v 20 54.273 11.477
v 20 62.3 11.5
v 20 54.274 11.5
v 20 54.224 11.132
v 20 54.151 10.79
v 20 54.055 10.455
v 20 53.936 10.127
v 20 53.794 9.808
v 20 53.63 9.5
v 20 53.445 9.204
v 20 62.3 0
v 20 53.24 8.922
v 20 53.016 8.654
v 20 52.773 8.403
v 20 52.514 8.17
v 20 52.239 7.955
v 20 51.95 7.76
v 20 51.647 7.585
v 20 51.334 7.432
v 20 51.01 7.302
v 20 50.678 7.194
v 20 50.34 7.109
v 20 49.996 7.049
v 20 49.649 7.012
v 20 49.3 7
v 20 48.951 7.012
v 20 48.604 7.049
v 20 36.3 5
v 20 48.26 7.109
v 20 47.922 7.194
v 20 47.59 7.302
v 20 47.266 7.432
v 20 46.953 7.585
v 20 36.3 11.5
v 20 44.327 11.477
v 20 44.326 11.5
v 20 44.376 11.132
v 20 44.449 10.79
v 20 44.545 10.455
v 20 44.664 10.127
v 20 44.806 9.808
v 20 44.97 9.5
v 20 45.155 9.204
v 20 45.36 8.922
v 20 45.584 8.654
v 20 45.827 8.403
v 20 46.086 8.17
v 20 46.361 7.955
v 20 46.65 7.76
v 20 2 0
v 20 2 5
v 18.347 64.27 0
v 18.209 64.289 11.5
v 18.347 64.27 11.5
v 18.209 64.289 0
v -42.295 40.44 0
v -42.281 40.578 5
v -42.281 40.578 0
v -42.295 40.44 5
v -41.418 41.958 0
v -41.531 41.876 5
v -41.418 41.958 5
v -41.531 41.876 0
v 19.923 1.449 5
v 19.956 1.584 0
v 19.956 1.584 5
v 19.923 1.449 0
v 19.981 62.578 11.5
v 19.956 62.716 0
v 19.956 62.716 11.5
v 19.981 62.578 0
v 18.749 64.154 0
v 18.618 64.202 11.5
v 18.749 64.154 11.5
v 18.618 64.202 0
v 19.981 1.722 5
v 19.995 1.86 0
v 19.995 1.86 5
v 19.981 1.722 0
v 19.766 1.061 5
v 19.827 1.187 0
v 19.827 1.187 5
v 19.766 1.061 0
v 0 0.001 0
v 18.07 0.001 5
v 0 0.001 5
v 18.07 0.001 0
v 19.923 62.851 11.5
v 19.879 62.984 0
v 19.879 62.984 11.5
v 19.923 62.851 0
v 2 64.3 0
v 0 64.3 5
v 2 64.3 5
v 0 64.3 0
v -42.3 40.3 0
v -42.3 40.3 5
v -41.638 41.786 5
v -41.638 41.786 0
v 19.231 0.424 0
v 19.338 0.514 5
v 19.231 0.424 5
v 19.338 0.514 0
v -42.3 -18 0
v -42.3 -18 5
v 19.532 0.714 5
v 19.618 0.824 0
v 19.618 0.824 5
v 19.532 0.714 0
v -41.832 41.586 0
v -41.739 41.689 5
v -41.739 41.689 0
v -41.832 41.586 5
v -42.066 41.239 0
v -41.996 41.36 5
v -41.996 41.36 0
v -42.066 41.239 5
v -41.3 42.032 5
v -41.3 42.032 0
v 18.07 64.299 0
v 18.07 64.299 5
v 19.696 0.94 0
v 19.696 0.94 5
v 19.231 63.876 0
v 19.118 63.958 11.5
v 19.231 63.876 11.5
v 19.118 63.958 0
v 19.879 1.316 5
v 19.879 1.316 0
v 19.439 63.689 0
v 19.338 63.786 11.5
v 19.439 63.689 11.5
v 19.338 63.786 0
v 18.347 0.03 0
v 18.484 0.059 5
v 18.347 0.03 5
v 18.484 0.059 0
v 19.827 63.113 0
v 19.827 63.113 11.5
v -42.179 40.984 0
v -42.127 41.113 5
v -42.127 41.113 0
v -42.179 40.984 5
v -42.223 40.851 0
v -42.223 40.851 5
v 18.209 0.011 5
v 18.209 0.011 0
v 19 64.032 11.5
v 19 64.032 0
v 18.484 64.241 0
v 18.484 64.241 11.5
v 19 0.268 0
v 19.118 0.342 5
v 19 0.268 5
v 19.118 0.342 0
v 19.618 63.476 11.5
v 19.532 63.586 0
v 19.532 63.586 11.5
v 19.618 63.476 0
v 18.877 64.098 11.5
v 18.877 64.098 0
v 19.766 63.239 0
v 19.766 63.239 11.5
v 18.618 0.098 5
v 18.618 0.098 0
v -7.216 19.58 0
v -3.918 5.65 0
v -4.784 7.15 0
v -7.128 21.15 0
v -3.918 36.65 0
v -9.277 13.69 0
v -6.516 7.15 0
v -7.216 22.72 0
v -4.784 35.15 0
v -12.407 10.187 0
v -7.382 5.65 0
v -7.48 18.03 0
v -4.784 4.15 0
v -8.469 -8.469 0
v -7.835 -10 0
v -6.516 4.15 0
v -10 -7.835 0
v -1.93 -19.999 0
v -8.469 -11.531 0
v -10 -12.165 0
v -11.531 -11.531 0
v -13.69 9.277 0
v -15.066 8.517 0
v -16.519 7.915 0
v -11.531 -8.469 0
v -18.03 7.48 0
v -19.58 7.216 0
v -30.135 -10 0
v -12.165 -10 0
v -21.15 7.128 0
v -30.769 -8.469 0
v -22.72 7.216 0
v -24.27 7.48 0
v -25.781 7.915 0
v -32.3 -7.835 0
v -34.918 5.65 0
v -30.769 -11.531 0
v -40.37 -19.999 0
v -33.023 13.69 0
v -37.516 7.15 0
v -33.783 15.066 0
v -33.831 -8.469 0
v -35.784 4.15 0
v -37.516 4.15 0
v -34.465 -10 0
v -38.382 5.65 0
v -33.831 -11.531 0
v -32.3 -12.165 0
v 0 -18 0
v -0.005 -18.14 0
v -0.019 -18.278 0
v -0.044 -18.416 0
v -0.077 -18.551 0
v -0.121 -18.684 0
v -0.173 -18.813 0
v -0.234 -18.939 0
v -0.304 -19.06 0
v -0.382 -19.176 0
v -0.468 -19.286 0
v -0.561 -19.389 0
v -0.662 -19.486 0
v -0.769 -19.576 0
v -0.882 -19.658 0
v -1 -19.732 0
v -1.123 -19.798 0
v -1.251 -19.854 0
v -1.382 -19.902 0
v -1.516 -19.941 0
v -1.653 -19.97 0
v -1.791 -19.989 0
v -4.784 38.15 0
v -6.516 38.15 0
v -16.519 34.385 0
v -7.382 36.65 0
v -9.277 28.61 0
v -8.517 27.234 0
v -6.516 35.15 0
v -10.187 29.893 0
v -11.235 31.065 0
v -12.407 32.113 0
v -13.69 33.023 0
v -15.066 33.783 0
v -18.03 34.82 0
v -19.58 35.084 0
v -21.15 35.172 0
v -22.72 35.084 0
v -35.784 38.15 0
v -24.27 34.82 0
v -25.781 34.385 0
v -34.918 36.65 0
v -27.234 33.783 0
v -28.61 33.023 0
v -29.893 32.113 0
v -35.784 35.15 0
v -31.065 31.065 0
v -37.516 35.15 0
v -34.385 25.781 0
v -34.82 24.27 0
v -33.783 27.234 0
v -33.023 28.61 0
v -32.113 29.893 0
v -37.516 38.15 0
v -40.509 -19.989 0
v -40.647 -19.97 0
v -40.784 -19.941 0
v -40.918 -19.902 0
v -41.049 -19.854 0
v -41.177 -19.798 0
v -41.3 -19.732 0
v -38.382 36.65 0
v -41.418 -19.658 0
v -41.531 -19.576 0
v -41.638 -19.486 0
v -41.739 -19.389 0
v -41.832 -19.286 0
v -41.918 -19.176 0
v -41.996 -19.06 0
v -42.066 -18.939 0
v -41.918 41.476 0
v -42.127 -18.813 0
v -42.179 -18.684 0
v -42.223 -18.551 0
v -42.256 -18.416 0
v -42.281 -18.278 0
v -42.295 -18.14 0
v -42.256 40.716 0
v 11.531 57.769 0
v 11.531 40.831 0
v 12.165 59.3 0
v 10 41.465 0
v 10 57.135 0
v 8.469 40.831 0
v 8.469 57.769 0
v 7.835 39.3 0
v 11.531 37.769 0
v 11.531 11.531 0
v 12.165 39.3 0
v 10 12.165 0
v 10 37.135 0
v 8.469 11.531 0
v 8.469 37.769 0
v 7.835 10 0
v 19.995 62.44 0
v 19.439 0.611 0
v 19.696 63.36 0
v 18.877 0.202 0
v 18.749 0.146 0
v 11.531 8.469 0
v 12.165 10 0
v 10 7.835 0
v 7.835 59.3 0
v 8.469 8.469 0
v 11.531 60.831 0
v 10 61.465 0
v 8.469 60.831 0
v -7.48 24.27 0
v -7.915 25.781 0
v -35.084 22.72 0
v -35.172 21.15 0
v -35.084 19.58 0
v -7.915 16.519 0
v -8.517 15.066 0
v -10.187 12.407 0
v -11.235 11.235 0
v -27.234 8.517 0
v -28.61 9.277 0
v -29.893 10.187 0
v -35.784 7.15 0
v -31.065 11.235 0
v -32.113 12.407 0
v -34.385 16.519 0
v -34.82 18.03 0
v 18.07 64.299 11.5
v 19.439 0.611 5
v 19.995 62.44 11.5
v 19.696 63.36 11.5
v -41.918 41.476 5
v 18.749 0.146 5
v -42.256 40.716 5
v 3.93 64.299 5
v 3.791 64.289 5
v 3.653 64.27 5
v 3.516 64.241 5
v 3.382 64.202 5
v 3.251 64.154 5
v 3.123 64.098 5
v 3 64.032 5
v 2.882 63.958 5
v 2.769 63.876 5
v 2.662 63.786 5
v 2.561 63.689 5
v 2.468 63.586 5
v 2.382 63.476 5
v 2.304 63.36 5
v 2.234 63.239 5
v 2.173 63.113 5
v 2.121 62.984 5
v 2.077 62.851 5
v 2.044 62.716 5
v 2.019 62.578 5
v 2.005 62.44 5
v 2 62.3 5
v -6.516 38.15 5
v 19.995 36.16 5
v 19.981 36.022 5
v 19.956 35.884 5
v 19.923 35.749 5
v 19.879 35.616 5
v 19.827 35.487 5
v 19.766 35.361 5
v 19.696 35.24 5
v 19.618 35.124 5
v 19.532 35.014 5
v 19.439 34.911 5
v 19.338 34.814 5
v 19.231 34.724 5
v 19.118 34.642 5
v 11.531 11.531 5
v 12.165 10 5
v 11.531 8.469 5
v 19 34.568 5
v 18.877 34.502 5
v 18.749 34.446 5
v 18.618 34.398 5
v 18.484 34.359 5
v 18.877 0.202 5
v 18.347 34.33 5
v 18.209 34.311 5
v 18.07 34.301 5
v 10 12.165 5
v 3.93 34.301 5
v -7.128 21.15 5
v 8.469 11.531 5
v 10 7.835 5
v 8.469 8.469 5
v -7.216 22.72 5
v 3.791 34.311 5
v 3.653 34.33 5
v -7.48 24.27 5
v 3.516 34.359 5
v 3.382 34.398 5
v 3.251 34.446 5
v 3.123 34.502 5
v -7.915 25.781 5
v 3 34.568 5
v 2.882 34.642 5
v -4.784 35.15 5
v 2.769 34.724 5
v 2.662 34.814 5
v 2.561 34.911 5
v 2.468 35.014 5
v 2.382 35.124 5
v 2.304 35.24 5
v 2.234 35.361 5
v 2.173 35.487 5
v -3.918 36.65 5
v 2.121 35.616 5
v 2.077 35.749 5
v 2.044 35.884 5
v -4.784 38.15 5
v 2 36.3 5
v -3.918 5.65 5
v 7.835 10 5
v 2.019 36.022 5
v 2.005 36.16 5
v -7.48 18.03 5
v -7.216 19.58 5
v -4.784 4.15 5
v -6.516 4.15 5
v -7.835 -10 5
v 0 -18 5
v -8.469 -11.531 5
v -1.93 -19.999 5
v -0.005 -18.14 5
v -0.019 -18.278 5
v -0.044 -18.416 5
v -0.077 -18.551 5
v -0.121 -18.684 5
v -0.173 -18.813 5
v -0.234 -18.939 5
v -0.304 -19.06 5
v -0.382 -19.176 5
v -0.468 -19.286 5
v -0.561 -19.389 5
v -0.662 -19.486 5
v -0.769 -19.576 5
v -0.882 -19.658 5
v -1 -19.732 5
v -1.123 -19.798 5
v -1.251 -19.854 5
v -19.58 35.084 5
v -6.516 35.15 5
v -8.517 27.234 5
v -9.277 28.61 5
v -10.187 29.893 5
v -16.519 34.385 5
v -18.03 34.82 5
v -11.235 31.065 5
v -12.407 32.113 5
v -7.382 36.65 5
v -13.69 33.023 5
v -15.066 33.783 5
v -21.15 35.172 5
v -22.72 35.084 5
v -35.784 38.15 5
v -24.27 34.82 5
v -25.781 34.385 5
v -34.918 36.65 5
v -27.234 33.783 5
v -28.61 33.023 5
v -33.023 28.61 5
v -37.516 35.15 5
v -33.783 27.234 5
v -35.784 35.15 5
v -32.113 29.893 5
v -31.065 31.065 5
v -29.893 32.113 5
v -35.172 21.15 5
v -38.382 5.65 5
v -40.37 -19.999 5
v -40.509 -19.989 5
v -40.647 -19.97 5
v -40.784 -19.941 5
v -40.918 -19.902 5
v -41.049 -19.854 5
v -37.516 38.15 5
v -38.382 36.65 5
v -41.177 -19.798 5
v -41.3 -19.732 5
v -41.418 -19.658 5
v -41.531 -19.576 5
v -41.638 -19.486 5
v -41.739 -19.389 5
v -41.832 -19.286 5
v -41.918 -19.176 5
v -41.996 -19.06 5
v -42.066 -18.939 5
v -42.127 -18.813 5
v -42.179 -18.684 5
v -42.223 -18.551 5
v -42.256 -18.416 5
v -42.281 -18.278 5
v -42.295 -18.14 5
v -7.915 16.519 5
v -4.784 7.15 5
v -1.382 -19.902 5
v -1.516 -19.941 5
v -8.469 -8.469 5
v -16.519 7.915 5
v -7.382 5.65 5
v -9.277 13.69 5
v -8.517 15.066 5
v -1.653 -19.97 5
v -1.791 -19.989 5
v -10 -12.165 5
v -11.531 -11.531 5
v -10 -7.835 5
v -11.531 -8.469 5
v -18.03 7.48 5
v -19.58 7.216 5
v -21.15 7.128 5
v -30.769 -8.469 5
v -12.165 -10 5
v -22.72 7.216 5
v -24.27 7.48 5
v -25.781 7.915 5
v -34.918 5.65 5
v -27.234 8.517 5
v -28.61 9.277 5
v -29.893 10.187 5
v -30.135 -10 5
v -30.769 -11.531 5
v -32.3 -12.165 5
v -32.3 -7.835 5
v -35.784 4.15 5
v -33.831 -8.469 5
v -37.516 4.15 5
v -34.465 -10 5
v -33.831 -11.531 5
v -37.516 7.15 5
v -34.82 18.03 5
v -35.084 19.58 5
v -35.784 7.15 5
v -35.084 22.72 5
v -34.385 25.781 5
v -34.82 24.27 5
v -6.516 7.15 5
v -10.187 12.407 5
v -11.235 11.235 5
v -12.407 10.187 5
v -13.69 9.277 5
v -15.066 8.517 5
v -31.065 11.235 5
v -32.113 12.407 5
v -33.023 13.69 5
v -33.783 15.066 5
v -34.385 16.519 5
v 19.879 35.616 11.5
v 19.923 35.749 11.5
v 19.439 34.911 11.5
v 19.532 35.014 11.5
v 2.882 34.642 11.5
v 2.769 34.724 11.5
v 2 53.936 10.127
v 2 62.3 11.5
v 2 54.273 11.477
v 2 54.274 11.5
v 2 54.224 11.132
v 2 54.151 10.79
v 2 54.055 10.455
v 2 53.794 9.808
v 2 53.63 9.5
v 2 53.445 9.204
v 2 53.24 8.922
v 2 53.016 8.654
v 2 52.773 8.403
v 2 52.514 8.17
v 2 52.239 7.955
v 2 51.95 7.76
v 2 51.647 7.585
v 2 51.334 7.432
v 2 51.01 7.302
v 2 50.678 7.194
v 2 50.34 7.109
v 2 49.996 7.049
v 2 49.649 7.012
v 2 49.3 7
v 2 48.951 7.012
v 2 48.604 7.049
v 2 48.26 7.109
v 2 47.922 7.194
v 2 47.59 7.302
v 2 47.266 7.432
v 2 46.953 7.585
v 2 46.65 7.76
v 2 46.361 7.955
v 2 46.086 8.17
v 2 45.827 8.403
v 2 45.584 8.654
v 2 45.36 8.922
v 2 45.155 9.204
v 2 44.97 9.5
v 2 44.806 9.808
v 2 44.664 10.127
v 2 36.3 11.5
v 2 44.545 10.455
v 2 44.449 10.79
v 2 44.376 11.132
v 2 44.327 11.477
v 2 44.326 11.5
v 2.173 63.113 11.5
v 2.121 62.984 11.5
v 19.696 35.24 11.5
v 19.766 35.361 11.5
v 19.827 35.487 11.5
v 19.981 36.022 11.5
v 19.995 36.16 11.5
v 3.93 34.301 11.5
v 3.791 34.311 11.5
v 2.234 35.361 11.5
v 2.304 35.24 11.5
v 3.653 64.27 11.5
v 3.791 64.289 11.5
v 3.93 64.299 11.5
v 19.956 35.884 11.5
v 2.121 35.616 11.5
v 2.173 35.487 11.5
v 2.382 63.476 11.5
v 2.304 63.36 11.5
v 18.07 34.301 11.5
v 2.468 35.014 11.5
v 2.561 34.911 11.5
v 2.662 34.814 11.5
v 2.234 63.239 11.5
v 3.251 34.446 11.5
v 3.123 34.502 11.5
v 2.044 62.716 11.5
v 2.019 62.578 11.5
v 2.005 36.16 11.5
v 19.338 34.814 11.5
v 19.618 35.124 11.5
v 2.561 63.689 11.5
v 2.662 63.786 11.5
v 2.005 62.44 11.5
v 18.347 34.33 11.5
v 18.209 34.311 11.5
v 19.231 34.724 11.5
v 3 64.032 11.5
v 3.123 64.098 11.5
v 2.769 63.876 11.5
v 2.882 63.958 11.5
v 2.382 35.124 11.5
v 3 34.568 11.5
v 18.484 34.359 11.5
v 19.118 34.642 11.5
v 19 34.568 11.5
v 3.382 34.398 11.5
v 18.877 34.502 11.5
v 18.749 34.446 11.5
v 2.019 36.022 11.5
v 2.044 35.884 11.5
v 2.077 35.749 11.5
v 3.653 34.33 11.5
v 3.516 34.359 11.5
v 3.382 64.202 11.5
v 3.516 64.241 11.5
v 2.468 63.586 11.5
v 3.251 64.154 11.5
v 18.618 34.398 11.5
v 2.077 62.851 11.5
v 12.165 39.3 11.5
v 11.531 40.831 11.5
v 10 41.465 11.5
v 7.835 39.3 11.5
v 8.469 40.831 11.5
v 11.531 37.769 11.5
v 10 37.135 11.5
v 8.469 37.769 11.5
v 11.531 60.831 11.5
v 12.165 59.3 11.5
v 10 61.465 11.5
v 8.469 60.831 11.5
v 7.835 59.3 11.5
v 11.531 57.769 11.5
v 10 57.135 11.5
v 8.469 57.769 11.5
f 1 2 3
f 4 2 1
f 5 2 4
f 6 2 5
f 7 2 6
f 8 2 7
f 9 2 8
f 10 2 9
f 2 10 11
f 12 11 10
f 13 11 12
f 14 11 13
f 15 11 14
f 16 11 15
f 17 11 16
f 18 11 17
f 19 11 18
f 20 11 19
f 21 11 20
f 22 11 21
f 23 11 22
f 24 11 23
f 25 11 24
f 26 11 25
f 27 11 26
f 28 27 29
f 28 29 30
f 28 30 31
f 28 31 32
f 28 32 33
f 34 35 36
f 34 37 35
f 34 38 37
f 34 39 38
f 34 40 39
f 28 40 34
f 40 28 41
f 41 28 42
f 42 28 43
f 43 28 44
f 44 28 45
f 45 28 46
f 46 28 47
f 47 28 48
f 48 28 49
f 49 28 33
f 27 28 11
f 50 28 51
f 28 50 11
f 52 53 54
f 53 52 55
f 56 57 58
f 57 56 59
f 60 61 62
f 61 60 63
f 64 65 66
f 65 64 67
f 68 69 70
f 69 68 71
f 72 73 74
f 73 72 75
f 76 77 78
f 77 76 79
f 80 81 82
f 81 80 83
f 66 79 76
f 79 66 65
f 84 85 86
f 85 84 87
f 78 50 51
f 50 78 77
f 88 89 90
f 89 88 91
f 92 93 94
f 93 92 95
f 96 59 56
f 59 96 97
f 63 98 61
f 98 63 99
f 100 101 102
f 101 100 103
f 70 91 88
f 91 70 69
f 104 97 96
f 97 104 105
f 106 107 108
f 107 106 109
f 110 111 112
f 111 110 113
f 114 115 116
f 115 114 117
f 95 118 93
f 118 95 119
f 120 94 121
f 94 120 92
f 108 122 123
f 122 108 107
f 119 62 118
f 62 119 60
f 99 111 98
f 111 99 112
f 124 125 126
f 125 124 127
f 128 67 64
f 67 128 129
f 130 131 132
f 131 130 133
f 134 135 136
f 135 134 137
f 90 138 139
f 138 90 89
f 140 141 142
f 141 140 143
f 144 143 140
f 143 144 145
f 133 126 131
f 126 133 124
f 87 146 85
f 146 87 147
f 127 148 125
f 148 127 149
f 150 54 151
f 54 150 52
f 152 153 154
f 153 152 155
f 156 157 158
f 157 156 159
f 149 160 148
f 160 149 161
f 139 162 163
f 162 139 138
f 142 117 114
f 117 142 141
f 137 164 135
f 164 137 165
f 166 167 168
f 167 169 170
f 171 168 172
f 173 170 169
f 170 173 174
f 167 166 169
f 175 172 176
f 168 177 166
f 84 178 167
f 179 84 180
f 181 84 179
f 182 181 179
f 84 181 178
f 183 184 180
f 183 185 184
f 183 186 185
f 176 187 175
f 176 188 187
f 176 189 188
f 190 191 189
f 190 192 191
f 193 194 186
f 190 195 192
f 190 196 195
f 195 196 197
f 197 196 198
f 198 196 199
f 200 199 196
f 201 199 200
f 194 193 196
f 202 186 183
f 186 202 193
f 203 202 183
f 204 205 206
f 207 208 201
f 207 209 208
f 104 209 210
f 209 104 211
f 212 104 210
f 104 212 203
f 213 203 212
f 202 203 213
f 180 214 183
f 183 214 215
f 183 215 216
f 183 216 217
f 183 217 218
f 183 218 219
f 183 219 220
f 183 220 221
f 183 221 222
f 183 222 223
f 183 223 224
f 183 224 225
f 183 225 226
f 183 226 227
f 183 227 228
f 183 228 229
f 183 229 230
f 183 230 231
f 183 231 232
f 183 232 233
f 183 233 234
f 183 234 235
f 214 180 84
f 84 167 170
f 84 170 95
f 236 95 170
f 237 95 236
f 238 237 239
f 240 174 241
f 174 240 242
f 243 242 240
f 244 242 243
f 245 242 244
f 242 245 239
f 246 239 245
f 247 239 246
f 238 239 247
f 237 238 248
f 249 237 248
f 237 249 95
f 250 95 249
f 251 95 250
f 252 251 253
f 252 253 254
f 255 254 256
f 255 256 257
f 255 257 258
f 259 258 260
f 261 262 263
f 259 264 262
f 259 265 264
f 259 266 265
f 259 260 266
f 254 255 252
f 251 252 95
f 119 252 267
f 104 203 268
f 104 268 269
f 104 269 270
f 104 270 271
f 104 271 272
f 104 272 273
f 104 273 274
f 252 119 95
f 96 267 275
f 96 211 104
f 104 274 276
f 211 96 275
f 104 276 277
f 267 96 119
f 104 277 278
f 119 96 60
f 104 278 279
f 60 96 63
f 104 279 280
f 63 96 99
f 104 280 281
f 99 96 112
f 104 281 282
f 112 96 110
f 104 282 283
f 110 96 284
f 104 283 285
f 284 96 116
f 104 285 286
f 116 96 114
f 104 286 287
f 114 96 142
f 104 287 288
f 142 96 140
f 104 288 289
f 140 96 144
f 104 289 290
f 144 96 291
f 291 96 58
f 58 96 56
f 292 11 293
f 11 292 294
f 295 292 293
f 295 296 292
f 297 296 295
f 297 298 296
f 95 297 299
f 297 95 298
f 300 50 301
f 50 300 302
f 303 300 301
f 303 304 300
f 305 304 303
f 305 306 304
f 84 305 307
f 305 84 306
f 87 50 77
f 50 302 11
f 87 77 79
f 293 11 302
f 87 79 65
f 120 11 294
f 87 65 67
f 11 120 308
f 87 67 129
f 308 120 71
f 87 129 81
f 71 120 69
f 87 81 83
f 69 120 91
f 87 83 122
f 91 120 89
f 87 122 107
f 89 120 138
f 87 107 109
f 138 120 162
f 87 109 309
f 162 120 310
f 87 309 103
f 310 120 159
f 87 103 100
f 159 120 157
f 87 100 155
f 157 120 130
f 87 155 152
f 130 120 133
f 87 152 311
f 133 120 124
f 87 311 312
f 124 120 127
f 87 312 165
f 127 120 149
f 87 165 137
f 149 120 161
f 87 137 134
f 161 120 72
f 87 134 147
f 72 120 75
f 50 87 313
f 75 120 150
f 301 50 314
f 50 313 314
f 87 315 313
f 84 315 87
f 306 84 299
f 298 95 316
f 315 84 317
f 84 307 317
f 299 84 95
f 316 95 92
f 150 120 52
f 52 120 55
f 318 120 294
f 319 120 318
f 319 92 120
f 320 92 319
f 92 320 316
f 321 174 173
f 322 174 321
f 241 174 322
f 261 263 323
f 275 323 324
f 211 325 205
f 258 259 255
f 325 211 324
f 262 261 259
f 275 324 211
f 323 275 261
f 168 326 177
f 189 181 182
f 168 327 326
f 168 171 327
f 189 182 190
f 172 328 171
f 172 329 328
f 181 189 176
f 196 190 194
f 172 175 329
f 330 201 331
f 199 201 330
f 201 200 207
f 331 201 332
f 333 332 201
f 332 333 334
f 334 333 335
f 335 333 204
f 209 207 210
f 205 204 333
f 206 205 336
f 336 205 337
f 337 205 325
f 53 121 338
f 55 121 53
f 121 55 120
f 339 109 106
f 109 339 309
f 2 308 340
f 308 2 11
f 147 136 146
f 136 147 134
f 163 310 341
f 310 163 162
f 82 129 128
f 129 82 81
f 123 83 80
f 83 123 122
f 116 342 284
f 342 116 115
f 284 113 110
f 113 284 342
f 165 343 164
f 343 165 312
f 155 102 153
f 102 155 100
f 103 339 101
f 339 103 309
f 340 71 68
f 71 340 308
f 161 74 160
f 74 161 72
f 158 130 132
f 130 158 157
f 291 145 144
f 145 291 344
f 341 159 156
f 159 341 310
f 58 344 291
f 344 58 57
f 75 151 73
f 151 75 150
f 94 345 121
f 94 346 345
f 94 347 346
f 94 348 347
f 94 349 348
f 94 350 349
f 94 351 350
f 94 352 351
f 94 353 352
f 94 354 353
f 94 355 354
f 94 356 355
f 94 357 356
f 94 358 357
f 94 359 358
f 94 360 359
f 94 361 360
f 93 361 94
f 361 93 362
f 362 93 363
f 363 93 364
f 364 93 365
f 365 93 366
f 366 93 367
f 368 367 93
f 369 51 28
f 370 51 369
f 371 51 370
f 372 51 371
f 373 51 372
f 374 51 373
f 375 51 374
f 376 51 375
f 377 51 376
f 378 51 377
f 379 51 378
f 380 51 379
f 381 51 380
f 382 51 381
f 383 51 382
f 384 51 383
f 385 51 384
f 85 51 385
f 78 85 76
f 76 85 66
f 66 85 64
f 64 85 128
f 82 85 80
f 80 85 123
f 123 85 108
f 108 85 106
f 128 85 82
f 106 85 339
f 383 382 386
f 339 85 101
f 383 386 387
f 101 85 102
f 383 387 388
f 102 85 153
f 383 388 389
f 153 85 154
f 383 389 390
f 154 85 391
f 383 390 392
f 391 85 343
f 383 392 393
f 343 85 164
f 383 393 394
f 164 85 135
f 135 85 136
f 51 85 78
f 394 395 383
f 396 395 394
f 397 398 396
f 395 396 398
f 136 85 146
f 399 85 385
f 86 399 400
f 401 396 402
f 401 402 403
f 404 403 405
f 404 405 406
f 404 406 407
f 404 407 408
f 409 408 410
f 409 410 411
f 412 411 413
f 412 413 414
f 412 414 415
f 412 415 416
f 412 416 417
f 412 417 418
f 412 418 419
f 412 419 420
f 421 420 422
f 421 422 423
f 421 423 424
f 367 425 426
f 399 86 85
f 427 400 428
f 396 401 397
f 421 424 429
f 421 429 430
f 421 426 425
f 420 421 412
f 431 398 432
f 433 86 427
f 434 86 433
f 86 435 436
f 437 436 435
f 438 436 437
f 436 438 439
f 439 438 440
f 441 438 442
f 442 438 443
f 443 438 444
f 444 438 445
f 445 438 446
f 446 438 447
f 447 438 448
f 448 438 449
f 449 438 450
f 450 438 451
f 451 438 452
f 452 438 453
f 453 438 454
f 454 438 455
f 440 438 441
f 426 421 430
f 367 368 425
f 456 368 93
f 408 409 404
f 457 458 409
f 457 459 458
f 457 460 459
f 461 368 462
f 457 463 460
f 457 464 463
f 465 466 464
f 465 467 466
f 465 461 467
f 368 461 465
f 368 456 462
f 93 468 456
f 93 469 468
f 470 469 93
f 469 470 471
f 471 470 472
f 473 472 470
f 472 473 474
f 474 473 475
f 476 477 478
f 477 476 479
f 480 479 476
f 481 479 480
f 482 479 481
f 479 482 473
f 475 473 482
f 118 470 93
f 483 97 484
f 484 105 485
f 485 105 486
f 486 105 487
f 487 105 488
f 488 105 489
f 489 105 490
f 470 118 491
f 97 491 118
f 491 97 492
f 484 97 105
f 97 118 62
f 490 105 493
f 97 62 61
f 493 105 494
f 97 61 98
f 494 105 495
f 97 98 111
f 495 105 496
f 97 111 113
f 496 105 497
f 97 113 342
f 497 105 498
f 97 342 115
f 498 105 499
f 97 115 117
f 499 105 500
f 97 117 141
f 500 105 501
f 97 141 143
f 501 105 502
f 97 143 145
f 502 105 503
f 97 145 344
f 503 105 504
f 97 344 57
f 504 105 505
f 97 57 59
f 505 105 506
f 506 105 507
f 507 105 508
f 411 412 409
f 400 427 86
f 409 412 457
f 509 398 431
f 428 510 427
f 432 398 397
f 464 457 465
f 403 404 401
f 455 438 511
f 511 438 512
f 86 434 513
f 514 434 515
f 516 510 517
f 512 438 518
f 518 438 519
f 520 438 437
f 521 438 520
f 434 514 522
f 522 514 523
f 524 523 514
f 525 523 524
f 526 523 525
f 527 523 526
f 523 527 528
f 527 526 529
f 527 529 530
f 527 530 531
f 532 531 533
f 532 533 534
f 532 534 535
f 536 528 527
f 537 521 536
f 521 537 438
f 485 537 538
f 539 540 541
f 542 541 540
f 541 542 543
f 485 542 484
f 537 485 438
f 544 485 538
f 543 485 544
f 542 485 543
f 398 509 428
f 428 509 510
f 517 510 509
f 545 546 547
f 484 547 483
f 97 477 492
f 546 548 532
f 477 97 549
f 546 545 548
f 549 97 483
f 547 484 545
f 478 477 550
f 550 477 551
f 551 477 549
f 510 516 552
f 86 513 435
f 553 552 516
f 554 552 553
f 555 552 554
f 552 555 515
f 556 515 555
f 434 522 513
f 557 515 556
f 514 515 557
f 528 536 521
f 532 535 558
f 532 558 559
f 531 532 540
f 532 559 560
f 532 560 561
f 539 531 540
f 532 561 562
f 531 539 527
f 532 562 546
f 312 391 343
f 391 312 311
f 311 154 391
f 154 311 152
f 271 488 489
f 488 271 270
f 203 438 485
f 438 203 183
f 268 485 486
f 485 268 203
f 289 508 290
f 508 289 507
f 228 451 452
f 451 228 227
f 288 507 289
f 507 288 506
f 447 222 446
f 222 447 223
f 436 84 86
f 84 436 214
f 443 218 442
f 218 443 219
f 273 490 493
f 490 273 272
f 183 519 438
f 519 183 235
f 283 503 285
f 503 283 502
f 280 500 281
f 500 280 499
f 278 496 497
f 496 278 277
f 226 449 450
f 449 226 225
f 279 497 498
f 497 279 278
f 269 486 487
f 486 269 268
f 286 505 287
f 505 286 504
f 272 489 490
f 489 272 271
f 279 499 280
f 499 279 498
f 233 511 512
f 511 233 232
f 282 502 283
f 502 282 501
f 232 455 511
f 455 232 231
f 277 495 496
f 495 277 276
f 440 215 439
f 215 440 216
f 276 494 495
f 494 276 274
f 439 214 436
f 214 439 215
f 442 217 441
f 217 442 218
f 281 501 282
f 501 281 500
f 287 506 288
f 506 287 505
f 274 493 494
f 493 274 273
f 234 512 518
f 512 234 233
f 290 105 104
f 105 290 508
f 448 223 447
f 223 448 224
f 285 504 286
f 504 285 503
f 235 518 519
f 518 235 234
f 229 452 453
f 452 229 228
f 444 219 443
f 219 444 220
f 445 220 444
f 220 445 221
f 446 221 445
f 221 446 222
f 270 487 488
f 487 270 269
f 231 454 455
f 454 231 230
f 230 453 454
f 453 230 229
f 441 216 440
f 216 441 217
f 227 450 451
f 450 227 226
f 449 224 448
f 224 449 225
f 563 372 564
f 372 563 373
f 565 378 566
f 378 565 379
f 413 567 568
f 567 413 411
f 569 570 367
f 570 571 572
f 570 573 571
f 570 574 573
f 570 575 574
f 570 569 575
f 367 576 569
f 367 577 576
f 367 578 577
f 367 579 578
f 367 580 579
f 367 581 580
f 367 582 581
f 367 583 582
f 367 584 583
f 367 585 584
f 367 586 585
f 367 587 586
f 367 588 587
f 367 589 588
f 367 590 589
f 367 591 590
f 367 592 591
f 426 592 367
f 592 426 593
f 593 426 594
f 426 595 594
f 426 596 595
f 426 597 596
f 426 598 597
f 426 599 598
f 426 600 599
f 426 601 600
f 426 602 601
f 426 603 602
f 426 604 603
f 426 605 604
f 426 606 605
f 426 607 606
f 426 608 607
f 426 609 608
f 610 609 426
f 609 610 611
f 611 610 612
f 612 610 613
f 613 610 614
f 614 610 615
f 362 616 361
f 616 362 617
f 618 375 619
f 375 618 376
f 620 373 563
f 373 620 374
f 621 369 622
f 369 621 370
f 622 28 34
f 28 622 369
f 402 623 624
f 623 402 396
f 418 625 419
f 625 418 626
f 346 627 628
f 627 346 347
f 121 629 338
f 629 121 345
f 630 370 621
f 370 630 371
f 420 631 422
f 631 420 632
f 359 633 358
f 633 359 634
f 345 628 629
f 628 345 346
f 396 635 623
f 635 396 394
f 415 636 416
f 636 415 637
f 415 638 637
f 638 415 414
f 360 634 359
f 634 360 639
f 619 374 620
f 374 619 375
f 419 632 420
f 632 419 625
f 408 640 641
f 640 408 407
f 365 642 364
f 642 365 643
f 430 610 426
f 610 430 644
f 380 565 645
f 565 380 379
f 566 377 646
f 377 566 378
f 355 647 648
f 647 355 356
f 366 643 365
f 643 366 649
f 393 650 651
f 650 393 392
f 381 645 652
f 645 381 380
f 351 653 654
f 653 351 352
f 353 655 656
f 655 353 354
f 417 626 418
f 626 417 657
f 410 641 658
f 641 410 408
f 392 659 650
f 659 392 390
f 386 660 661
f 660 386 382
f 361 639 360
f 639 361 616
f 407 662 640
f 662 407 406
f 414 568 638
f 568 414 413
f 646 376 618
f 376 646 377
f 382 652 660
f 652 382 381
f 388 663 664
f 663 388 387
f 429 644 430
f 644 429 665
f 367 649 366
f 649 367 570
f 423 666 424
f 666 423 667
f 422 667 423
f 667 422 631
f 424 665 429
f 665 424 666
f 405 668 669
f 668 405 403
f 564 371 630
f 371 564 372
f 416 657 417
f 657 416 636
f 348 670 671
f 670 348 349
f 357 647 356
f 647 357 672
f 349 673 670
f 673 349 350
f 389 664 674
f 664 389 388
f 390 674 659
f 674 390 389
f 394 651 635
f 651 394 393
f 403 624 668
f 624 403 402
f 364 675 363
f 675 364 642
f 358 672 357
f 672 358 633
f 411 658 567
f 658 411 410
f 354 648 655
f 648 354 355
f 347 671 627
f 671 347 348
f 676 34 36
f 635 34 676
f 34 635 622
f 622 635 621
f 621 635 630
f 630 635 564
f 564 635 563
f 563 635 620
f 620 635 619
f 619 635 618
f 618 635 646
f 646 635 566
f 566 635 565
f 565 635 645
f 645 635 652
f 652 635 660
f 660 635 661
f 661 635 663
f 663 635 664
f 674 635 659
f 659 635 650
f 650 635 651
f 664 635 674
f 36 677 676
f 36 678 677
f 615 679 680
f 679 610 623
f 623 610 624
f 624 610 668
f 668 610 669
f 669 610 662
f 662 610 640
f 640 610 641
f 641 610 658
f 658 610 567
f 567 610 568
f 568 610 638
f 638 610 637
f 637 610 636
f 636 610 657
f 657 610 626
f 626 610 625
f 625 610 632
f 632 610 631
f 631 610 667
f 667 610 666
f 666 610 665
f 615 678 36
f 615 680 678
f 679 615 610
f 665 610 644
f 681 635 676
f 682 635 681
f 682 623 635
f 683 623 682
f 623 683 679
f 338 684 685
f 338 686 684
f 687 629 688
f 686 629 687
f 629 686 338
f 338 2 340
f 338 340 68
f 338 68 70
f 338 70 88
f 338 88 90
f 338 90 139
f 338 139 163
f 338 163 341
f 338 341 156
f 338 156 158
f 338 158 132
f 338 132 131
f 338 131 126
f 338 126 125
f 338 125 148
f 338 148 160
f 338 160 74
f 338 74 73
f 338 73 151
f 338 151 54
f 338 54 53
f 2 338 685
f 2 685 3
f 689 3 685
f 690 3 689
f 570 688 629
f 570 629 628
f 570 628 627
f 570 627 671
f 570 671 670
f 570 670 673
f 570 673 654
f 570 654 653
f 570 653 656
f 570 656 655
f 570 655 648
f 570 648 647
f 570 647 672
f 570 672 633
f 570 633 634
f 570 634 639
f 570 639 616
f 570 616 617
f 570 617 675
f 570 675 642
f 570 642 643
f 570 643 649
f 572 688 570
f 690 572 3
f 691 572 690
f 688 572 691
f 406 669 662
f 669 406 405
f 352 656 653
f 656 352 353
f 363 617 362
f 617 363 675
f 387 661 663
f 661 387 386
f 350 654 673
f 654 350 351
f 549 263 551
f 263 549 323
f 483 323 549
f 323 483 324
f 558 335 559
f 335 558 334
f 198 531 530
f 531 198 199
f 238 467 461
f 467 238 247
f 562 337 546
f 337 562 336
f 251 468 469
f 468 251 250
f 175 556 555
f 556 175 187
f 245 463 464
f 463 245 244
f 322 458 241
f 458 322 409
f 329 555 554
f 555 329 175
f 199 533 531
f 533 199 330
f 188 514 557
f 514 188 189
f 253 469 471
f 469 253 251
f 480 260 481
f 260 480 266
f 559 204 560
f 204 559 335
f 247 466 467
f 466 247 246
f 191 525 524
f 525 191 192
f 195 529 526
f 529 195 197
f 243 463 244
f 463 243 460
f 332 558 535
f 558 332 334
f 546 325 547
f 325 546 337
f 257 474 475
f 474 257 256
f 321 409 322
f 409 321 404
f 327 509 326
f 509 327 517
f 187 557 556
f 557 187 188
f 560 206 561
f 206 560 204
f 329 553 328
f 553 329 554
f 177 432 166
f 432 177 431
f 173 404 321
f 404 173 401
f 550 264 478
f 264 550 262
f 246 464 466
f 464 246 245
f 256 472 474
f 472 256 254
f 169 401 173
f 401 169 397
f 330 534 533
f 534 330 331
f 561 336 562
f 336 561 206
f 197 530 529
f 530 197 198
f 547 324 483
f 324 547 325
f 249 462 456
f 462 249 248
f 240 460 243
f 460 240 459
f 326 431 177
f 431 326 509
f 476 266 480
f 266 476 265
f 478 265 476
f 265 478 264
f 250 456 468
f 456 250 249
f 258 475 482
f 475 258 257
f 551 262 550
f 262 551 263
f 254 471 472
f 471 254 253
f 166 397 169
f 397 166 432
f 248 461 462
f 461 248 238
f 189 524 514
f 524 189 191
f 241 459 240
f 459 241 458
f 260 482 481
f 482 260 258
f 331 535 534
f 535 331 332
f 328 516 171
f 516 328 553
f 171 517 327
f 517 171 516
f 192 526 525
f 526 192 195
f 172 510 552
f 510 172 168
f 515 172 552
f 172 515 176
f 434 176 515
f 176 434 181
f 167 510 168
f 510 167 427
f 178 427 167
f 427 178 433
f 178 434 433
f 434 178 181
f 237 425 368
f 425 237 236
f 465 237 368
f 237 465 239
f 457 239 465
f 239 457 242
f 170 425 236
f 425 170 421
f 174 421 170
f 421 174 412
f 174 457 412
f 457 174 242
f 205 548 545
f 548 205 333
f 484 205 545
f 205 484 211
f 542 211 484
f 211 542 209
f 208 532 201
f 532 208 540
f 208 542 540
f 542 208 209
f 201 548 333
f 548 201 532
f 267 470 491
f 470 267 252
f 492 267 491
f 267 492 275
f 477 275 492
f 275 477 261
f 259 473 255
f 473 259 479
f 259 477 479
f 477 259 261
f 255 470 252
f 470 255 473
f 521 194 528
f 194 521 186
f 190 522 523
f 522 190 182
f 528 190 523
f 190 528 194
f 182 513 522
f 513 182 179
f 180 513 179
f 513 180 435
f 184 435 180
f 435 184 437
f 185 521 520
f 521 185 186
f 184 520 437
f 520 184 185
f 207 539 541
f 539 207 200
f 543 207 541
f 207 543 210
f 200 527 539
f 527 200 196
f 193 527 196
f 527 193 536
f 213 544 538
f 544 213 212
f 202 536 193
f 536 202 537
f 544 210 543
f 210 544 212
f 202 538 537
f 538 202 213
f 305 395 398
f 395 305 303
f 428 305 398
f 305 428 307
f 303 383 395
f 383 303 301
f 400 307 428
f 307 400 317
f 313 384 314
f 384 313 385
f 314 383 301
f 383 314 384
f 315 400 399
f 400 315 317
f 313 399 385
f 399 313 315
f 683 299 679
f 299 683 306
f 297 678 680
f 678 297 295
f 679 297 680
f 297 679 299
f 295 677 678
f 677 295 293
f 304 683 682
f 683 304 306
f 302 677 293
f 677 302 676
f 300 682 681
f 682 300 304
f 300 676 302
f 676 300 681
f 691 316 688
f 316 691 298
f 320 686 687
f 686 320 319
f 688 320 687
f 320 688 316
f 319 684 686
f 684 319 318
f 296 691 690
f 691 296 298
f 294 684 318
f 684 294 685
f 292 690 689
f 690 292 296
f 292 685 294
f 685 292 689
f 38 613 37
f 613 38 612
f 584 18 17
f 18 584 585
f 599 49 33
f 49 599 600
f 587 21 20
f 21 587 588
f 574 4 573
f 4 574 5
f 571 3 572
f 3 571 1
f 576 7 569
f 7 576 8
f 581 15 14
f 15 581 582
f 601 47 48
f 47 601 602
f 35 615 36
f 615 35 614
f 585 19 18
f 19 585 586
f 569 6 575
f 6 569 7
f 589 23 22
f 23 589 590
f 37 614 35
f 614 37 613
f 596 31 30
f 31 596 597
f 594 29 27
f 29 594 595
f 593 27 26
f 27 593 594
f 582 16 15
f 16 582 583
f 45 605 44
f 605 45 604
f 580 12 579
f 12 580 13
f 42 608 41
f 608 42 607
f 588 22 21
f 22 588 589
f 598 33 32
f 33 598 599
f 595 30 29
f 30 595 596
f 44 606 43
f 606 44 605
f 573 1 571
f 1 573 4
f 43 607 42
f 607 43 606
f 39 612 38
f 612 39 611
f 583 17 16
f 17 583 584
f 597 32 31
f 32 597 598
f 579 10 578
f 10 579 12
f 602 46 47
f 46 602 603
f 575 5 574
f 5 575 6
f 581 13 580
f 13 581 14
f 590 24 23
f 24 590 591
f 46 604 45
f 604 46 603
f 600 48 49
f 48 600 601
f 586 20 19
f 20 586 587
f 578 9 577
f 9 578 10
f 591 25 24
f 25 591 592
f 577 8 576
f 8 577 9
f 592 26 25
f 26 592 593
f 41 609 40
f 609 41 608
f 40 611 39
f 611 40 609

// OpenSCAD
// file: trunctear.scad
//A module for truncated tear drops.

trunctear(1, 0.5, $fn = 90);

module trunctear(height, radian)
{
    hull()
    {
        cylinder(h = height, r = radian);
        translate([0, radian/2, height/2])
            cube([2*(radian*(2*cos(45)-1)), radian, height], center = true);
    }
}
// file: polyhole.scad
// The Cylinder is dead! Long live the Cylinder!
// A module for a polyhole by radius, based on Nophead's work.

module polyhole(h, r, cent = false)
{
    n = max(round(4 * r), 3);
    cylinder(h = h, r = r / cos(180 / n), $fn = n, center = cent);
}
// file: CoreMotorMount.scad
// A mount for the motors of the x and y axis.

use<polyhole.scad>
use<trunctear.scad>

CoreMotorMount();

module CoreMotorMount()
{
    difference()
    {
        union()
        {
            hull()
            {
                translate([-18, 2, 0])
                    cylinder(h = 5, r = 2, $fn = 90);
                translate([-18, 42.3+22-2, 0])
                    cylinder(h = 5, r = 2, $fn = 90);
                translate([-1, 42.3+22-1, 5/2])
                    cube([2, 2, 5], center = true);
                translate([42.3-2, 2, 0])
                    cylinder(h = 5, r = 2, $fn = 90);
                translate([42.3-2, 42.3-2, 0])
                    cylinder(h = 5, r = 2, $fn = 90);
            }
            hull()
            {
                translate([2, -18, 0])
                    cylinder(h = 5, r = 2, $fn = 90);
                translate([2, 42.3-2, 0])
                    cylinder(h = 5, r = 2, $fn = 90);
                translate([42.3-2, -18, 0])
                    cylinder(h = 5, r = 2, $fn = 90);
                translate([42.3-2, 42.3-2, 0])
                    cylinder(h = 5, r = 2, $fn = 90);
            }
            hull()
            {
                translate([-18, 42.3+2+5-15+2, 0])
                    cylinder(h = 5+4.5+2, r = 2, $fn = 90);
                translate([-4, 42.3+2+5-15+2, 0])
                    cylinder(h = 5+4.5+2, r = 2, $fn = 90);
                translate([-18, 42.3+22-2, 0])
                    cylinder(h = 5+4.5+2, r = 2, $fn = 90);
                translate([-4, 42.3+22-2, 0])
                    cylinder(h = 5+4.5+2, r = 2, $fn = 90);
            }
        }
        translate([21.15, 21.15, 0])
            polyhole(8, 14);
        translate([5.65, 5.65, 0])
            polyhole(8, 1.5);
        translate([5.65, 36.65, 0])
            polyhole(8, 1.5);
        translate([36.65, 5.65, 0])
            polyhole(8, 1.5);
        translate([36.65, 36.65, 0])
            polyhole(8, 1.5);
        translate([10, -10, 0])
            polyhole(5, 2);
        translate([42.3-10, -10, 0])
            polyhole(5, 2);
        translate([-10, 10, 0])
            polyhole(5, 2);
        translate([-10, 42.3+2+5-10, 0])
            polyhole(5+4.5+2, 2);
        translate([-10, 42.3+2+5+10, 0])
            polyhole(5+4.5+2, 2);
        translate([-2, 42.3+2+5, 5+5+2])
            rotate([0, -90, 0])
                cylinder(h = 20, r = 5, $fn = 90);
    }
}
// main file
use<CoreMotorMount.scad>

CoreMotorMountMirror();

module CoreMotorMountMirror()
{
    scale([-1, 1, 1])
        CoreMotorMount();
}
